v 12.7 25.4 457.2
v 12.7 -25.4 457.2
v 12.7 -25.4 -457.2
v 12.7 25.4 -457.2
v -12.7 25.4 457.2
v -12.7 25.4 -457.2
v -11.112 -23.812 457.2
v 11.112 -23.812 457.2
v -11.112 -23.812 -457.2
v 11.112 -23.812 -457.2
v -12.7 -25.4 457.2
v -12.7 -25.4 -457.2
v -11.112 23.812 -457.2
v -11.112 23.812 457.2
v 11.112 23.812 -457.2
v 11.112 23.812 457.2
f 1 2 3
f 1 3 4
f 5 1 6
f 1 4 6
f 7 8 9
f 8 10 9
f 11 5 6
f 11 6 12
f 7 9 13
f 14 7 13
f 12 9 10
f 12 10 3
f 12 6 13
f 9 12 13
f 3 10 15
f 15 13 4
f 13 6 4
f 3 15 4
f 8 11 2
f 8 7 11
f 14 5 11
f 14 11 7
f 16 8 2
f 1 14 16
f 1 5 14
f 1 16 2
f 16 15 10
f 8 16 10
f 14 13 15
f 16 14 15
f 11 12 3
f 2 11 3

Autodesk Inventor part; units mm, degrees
ref_plane "YZ Plane" through (0, 0, 0) normal (1, 0, 0) x (0, 1, 0)
ref_plane "XZ Plane" through (0, 0, 0) normal (0, 1, 0) x (-1, 0, 0)
ref_plane "XY Plane" through (0, 0, 0) normal (0, 0, 1) x (1, 0, 0)
sketch "Sketch1" plane through (0, 0, 0) normal (0, 0, 1) x (1, 0, 0)
  line L0 (-12.7, -25.4) -> (12.7, -25.4)
  line L1 (12.7, -25.4) -> (12.7, 25.4)
  line L2 (12.7, 25.4) -> (-12.7, 25.4)
  line L3 (-12.7, 25.4) -> (-12.7, -25.4)
  line L4 (-12.7, -25.4) -> (12.7, 25.4) construction
  line L5 (12.7, -25.4) -> (-12.7, 25.4) construction
  line L6 (-11.1125, 23.8125) -> (11.1125, 23.8125)
  line L7 (11.1125, 23.8125) -> (11.1125, -23.8125)
  line L8 (11.1125, -23.8125) -> (-11.1125, -23.8125)
  line L9 (-11.1125, -23.8125) -> (-11.1125, 23.8125)
  point P0 (0, 0)
  dimension "width" = 25.4
  dimension "height" = 50.8
  dimension "thickness" = 1.5875
extrude "Extrusion1" add sketch "Sketch1" along normal mid plane 914.4
properties part number "MU-EV-01" material "Aluminum 6061"
